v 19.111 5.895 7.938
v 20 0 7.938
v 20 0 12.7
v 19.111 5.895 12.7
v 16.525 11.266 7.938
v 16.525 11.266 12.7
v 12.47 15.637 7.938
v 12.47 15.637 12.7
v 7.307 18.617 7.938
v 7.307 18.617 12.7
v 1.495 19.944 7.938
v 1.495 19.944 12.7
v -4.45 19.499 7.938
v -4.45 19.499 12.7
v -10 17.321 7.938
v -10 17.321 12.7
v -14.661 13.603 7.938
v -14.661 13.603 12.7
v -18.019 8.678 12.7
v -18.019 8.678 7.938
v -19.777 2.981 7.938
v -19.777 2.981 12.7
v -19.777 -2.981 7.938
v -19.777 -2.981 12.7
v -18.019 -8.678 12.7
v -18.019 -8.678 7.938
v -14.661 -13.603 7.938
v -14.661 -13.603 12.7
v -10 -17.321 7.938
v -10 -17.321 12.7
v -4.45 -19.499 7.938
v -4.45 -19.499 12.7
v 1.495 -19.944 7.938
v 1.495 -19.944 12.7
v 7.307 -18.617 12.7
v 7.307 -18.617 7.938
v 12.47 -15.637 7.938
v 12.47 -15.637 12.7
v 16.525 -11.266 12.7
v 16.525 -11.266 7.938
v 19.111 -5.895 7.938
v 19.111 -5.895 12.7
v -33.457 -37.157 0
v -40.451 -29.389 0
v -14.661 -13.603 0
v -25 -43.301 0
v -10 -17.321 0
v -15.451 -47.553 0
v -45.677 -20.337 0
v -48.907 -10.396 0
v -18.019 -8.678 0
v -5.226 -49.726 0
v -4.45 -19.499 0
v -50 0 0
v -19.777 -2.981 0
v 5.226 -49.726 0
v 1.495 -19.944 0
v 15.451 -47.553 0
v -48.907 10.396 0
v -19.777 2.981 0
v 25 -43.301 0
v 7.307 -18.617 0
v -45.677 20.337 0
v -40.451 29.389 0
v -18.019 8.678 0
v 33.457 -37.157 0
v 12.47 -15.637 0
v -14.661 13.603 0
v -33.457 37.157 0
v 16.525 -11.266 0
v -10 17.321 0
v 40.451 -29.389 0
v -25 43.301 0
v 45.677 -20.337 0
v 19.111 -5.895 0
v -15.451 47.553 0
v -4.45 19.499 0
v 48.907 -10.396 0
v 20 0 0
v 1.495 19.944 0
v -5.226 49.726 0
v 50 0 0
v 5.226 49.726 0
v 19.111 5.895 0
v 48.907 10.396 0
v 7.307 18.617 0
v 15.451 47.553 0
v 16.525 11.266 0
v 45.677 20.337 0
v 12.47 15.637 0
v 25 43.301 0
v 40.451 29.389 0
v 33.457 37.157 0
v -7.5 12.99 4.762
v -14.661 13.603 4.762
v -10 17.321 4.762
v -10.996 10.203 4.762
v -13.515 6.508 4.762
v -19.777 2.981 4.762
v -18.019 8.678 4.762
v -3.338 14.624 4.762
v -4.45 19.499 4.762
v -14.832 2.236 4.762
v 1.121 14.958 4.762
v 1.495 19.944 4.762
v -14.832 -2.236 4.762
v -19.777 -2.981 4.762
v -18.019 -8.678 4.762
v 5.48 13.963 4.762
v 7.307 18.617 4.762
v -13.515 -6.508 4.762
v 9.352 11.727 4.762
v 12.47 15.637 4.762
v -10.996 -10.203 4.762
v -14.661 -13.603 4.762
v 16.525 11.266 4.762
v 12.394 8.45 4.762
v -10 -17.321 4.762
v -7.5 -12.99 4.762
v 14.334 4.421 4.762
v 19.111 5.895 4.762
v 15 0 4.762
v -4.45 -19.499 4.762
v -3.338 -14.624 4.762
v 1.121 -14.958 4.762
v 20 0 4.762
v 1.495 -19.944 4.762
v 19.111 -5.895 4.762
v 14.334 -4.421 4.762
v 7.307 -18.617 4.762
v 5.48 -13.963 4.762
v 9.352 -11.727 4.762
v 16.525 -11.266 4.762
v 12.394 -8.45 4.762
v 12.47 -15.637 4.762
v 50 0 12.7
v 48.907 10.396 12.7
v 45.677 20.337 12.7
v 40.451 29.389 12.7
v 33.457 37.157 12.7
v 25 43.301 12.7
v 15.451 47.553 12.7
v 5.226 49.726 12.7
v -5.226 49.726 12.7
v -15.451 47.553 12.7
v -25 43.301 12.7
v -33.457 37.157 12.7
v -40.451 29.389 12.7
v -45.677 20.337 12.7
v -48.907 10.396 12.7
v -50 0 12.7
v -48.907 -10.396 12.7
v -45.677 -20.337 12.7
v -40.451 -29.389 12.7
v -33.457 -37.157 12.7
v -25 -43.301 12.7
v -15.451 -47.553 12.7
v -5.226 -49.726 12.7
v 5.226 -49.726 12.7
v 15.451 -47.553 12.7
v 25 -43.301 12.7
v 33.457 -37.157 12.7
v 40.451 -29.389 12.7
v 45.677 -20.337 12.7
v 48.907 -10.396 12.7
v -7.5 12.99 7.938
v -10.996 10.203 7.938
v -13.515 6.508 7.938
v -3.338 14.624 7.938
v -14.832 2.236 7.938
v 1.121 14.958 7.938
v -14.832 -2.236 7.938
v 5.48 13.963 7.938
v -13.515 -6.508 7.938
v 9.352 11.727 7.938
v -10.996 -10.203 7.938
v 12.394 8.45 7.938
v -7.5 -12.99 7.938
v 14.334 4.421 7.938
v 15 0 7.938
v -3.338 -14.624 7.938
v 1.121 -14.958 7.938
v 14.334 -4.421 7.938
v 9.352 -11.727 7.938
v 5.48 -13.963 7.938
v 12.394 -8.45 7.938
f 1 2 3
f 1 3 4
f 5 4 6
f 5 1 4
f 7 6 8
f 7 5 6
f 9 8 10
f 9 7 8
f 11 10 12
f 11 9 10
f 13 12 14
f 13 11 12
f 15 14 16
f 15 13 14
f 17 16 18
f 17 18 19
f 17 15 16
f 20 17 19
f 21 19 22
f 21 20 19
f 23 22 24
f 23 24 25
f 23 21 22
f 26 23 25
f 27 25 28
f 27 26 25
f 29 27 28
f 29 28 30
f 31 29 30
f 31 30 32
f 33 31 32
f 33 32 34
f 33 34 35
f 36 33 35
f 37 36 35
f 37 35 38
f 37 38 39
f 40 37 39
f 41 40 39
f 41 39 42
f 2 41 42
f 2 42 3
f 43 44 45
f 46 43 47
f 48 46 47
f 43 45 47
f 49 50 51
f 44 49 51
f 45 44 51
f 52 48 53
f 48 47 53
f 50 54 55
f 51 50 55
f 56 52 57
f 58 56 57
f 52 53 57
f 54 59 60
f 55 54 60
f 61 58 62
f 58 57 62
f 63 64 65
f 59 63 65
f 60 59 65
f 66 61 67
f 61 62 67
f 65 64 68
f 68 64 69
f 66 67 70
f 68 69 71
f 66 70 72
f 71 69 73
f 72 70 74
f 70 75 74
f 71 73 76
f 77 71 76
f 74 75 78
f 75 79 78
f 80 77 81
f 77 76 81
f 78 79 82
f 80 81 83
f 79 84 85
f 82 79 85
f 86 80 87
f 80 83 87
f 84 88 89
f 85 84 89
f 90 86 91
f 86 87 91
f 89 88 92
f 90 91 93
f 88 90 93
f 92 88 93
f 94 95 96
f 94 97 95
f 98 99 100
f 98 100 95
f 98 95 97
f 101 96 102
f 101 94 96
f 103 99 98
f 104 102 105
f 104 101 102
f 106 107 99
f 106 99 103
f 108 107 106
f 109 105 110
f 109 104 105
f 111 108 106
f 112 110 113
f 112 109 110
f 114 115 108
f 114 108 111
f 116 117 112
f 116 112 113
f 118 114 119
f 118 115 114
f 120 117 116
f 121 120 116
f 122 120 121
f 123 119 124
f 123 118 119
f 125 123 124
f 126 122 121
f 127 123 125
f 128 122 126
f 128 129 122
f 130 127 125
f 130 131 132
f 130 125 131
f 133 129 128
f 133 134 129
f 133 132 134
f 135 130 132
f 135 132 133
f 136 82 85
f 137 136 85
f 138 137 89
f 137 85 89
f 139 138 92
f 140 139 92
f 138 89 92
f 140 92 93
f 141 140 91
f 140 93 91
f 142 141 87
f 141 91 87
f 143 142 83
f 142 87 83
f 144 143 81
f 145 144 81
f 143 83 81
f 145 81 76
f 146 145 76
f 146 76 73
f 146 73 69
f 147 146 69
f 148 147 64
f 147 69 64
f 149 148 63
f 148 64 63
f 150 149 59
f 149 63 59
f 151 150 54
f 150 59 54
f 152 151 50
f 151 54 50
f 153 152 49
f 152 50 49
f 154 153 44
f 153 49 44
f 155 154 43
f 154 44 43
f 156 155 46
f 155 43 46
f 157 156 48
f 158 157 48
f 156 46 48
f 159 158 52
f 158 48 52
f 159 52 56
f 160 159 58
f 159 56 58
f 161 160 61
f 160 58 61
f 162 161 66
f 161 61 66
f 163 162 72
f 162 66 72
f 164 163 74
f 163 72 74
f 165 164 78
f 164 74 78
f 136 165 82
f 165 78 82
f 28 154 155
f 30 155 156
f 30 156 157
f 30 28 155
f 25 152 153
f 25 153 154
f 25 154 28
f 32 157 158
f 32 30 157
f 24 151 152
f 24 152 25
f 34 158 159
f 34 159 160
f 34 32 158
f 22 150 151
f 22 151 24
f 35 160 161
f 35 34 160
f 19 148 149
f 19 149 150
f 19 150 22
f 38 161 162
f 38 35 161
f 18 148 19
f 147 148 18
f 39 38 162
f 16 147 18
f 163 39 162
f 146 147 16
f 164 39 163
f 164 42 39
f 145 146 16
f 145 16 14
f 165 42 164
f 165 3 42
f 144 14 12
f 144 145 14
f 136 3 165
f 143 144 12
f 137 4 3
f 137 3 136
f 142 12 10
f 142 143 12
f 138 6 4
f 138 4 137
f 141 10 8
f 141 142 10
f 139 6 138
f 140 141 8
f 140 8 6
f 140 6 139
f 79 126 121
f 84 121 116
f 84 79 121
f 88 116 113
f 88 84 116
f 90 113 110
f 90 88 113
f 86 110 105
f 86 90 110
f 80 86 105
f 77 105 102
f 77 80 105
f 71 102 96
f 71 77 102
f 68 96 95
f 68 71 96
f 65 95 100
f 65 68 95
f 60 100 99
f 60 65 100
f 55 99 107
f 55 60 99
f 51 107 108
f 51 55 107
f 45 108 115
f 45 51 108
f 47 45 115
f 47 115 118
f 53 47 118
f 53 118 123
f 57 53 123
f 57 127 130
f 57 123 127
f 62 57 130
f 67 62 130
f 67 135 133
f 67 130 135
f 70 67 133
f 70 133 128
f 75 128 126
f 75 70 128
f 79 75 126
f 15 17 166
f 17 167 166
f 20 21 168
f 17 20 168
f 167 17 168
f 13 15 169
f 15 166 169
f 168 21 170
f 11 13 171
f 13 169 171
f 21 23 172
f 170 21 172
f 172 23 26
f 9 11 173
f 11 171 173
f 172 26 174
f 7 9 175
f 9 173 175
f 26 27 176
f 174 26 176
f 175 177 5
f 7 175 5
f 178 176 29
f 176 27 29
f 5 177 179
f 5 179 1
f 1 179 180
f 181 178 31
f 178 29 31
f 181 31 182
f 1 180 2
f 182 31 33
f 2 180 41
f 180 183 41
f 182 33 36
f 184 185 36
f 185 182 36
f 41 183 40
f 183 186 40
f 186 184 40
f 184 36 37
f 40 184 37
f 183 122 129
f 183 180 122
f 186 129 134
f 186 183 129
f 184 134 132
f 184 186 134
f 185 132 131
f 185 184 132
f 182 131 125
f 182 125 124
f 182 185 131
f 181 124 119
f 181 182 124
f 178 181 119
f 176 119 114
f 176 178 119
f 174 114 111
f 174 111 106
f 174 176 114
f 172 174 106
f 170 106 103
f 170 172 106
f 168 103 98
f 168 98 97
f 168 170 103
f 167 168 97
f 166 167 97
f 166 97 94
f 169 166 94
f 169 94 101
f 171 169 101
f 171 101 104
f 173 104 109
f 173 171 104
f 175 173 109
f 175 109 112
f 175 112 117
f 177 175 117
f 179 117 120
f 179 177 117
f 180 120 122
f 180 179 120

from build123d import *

# Parameters (mm, degrees)
F0_R     = 50
F0_R_2   = 20
F1_DEPTH = 12.7
F3_R     = 20
F3_R_2   = 15
F4_DEPTH = 1.5875


with BuildPart() as f1:
    # F0 (on Top) → F1 (new body)
    with BuildSketch(Plane.XY):
        Circle(F0_R)
        Circle(F0_R_2, mode=Mode.SUBTRACT)
    extrude(amount=F1_DEPTH)

    # F3 (on mid) → F4 (join, symmetric)
    with BuildSketch(Plane(origin=(0, 0, 6.35), x_dir=(1, 0, 0), z_dir=(0, 0, -1))):
        Circle(F3_R)
        Circle(F3_R_2, mode=Mode.SUBTRACT)
    extrude(amount=F4_DEPTH, both=True)


solid = f1.part
